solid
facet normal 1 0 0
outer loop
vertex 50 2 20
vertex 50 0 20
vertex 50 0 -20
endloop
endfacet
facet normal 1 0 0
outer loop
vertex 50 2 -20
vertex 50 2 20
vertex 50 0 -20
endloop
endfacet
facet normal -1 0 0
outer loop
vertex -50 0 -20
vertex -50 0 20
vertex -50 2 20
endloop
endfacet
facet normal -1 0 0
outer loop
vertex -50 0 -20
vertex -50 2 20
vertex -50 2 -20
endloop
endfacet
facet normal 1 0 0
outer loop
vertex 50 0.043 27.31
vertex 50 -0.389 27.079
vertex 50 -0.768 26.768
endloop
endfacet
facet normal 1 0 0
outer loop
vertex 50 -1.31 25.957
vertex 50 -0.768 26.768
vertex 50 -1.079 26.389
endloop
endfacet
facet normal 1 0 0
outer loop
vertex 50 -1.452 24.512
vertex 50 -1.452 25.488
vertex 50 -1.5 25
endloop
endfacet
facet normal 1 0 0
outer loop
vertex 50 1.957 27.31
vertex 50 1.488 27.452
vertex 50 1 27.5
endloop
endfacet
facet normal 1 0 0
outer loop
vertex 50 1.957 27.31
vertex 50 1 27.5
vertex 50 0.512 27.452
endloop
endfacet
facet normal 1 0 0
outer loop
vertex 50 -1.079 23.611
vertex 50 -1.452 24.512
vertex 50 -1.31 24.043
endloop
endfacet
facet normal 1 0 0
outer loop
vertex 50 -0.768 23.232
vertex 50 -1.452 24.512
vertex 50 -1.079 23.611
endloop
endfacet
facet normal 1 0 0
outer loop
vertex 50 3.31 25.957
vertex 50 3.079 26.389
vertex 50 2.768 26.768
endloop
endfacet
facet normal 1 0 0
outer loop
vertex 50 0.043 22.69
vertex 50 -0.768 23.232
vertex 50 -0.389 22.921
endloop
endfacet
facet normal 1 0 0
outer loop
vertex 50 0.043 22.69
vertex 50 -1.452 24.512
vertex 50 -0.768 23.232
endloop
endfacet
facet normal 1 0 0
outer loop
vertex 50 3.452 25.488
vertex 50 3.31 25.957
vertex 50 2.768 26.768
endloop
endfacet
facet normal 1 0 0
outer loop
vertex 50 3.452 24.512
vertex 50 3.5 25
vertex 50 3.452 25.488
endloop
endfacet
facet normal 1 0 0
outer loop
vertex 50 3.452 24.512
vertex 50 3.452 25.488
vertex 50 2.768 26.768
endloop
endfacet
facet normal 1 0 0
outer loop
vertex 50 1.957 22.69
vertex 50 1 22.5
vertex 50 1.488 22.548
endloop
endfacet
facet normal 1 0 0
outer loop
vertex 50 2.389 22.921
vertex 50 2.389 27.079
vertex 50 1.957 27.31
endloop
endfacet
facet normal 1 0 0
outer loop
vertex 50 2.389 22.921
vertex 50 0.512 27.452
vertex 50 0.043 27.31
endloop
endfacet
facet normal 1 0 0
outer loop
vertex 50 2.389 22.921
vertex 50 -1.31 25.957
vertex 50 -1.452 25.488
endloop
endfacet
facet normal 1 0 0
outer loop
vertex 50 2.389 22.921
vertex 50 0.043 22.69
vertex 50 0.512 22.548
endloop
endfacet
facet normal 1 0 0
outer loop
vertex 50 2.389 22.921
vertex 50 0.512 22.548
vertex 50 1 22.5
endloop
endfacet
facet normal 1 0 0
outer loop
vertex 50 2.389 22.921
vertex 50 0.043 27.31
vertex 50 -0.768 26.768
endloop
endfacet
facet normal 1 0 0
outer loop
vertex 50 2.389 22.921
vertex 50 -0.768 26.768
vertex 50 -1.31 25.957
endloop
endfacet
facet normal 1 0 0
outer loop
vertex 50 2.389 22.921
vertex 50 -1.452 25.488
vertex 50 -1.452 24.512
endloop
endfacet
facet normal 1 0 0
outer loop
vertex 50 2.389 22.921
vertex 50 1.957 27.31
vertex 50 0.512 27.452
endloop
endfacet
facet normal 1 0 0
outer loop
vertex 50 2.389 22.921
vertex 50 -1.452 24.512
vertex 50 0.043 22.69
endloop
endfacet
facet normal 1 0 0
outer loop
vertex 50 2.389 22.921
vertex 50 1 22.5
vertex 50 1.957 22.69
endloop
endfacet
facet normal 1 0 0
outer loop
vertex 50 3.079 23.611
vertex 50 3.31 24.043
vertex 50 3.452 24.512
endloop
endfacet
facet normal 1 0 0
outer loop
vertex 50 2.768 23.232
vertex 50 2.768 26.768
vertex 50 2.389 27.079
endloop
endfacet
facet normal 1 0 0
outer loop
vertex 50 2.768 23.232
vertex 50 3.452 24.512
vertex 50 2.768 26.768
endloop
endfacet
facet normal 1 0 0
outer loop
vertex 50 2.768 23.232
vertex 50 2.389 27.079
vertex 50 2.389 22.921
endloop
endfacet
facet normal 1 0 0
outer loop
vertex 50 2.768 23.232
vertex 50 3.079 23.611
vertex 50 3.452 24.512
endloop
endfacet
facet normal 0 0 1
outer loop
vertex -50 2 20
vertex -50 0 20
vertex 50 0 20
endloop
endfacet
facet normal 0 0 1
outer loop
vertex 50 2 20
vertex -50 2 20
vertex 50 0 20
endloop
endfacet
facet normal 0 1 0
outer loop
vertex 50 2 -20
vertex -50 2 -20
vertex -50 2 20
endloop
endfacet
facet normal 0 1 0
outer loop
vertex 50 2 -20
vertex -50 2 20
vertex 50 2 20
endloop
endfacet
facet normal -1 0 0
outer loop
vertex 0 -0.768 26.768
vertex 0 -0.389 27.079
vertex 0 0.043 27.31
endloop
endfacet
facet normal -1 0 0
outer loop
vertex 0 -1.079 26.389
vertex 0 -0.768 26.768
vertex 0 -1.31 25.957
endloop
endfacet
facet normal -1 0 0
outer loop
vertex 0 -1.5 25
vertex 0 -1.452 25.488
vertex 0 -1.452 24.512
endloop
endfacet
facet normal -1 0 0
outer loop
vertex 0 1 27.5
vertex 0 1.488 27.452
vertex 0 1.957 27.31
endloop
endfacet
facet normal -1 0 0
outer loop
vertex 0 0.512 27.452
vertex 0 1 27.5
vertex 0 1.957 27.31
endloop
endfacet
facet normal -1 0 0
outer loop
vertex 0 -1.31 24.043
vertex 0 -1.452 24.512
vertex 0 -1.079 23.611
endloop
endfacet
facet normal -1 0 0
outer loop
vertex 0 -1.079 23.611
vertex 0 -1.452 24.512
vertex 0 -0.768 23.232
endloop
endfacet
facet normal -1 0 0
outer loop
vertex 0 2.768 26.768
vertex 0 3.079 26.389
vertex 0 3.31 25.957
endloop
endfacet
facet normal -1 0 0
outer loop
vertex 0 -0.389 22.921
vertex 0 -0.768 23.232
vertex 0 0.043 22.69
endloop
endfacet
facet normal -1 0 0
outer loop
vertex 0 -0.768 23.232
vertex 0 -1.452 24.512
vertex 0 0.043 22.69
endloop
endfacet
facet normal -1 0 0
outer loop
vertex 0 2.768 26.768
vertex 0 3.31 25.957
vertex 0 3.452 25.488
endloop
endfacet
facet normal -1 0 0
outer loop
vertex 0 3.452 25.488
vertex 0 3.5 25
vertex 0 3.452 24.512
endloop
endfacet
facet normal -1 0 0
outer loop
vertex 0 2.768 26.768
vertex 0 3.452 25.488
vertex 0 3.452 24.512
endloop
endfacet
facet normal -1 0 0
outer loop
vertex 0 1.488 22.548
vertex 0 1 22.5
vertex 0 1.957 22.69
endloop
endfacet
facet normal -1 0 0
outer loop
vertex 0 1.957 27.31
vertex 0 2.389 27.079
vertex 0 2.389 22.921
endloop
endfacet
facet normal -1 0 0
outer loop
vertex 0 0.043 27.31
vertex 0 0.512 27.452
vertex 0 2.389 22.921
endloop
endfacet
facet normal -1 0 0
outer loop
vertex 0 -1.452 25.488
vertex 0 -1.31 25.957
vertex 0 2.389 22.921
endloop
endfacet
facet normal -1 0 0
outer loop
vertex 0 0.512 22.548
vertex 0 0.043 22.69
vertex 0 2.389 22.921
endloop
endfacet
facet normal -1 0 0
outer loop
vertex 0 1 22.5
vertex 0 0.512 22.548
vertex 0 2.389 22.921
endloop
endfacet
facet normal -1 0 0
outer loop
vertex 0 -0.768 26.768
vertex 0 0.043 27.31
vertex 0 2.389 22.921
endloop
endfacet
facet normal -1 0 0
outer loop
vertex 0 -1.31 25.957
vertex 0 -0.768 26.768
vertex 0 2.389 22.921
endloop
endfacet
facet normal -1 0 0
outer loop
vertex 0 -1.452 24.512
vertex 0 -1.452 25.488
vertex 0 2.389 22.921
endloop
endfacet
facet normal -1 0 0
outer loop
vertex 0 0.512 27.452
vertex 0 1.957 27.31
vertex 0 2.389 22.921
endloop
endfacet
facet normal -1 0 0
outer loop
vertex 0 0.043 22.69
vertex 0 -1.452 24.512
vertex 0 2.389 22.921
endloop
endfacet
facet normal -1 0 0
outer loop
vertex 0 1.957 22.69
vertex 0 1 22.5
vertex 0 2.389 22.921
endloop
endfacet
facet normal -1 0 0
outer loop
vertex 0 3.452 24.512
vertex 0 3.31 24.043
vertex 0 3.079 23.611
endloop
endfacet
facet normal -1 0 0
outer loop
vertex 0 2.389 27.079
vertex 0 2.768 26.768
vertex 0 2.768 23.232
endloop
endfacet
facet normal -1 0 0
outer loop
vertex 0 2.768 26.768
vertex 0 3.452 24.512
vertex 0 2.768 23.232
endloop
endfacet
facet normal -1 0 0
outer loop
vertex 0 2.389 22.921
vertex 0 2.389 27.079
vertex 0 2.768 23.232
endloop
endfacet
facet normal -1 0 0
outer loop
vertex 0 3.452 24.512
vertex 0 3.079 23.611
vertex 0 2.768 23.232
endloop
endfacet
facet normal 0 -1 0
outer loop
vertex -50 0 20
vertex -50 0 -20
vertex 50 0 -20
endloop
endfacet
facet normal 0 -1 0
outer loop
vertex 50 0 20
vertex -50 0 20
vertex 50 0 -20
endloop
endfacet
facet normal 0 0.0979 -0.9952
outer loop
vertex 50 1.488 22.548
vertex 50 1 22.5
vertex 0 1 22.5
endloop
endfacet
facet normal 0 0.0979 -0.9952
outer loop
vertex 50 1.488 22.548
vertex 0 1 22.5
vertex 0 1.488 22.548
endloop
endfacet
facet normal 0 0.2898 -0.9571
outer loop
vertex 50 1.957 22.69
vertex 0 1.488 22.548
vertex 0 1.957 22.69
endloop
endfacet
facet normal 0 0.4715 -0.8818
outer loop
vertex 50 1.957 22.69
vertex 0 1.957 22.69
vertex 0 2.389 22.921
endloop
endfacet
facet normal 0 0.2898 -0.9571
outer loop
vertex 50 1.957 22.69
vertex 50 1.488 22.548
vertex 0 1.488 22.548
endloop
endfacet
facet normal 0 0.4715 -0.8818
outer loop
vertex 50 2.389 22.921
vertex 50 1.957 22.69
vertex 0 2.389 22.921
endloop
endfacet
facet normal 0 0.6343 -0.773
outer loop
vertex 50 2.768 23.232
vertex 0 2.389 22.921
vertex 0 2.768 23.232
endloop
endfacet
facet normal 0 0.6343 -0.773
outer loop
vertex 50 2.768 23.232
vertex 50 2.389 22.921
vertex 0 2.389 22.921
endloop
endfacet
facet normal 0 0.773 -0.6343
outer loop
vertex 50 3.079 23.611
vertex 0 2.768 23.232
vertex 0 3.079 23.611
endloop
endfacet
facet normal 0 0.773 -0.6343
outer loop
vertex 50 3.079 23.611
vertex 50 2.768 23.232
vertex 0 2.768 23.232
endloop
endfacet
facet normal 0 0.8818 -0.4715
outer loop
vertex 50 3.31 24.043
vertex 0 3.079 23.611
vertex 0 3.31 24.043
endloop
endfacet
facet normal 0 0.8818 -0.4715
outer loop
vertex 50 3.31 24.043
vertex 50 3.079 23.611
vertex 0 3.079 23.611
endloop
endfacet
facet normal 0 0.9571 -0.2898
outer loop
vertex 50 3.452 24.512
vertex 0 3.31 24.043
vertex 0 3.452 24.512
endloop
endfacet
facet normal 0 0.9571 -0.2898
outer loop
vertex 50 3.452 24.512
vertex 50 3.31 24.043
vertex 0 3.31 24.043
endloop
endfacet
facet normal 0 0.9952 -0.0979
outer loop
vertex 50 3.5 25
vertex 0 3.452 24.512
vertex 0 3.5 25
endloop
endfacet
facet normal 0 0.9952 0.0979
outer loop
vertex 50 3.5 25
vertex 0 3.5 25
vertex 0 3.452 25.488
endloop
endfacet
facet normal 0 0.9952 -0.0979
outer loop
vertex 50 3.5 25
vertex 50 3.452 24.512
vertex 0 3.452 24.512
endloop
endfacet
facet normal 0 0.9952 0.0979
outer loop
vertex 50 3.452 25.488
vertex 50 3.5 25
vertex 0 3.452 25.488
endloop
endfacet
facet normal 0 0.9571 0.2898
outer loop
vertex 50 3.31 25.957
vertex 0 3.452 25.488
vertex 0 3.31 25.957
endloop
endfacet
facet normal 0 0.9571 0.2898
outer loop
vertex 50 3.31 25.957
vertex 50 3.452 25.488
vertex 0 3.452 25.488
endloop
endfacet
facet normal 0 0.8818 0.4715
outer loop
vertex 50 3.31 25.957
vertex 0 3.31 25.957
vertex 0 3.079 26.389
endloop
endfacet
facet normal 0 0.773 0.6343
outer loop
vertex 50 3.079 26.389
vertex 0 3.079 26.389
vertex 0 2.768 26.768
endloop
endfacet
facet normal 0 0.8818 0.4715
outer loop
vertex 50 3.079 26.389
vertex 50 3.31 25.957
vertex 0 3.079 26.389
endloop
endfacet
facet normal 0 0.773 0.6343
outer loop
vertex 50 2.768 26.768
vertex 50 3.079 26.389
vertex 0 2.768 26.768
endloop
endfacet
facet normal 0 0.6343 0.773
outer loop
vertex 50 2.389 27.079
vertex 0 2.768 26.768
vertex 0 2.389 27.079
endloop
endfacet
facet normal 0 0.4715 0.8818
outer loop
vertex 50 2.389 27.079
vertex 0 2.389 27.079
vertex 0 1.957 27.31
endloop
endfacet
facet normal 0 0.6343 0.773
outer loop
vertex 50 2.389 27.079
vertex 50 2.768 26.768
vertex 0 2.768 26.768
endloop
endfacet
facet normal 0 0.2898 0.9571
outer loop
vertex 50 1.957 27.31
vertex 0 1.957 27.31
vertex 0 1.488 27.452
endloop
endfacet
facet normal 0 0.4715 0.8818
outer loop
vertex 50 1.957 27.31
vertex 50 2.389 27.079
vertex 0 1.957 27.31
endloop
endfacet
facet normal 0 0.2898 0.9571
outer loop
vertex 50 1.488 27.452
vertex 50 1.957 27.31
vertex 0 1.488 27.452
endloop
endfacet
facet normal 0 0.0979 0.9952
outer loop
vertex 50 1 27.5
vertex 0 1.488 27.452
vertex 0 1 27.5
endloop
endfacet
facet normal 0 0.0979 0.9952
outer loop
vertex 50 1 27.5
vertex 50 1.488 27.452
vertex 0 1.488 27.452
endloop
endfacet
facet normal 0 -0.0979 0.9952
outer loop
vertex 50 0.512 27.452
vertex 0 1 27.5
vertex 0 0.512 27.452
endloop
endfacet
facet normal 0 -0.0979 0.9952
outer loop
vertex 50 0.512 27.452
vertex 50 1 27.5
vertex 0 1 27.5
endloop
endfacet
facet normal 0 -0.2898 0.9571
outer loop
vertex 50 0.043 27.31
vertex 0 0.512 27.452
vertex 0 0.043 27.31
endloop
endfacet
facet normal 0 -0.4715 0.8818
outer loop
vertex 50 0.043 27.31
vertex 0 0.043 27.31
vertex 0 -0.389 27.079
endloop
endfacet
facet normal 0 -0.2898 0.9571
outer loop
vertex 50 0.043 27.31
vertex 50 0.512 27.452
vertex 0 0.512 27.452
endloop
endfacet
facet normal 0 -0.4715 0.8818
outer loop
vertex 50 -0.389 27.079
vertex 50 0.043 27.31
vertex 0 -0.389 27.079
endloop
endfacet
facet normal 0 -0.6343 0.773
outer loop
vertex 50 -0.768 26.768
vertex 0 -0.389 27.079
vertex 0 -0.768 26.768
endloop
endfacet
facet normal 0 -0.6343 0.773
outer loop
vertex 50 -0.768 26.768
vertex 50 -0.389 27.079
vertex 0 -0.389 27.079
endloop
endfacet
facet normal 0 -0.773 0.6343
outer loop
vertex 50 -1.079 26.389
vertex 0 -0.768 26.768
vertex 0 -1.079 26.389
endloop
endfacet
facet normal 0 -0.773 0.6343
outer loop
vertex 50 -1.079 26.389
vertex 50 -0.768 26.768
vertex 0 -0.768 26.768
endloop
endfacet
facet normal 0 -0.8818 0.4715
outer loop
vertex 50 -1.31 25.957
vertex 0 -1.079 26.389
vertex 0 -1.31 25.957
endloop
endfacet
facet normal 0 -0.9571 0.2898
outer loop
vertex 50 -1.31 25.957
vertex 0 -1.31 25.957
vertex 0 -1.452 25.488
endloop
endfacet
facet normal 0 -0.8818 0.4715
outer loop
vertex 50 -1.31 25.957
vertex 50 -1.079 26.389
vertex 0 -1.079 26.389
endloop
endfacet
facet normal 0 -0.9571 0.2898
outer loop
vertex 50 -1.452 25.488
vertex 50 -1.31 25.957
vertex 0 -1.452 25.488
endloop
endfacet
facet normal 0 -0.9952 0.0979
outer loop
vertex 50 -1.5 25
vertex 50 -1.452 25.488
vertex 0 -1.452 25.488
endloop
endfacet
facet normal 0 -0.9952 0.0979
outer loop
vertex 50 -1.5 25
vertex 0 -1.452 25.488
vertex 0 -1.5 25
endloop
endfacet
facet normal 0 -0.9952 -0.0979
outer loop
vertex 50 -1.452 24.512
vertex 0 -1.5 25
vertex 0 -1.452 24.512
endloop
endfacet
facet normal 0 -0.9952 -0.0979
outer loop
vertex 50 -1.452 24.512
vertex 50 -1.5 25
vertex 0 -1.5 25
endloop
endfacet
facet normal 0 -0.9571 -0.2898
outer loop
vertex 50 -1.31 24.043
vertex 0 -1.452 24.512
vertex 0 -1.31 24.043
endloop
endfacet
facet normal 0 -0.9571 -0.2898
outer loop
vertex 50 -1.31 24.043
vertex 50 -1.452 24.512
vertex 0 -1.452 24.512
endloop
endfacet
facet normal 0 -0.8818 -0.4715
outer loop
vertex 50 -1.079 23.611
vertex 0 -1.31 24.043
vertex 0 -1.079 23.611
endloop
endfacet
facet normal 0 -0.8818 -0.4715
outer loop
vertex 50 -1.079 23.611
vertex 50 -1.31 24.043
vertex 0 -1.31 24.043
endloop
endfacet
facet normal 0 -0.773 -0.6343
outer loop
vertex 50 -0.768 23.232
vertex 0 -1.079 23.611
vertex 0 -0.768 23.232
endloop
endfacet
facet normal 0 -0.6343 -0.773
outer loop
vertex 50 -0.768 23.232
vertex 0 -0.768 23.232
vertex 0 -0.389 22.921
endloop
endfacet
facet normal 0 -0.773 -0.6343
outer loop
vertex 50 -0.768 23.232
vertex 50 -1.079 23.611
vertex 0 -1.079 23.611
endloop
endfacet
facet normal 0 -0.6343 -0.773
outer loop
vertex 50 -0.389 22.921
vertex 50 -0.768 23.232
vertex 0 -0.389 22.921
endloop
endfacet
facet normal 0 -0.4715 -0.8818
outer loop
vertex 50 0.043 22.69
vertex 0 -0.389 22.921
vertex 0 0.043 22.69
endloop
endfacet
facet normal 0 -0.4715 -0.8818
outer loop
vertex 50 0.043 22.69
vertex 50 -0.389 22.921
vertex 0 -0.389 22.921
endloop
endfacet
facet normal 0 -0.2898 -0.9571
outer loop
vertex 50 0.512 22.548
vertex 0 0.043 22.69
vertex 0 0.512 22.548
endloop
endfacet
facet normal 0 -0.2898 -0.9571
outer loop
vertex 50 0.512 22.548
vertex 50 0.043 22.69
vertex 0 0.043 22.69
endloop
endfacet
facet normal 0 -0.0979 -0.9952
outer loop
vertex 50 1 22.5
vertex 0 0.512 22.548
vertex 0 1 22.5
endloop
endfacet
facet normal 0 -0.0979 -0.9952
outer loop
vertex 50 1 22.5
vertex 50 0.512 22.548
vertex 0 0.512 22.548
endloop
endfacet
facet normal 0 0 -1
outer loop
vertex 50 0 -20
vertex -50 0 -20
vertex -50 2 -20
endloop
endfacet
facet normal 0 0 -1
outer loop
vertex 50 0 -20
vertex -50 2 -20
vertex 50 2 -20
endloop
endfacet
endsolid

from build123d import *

# Parameters (mm, degrees)
SKETCH1_W           = 100
SKETCH1_H           = 40
BOSS_EXTRUDE1_DEPTH = 2
SKETCH2_R           = 2.5
BOSS_EXTRUDE2_DEPTH = 50


with BuildPart() as part:
    # Sketch1 → Boss-Extrude1 (new body)
    with BuildSketch(Plane(origin=(0, 0, 0), x_dir=(1, 0, 0), z_dir=(0, 1, 0))):
        Rectangle(SKETCH1_W, SKETCH1_H)
    extrude(amount=BOSS_EXTRUDE1_DEPTH)


with BuildPart() as body_2:
    # Sketch2 → Boss-Extrude2 (new body)
    with BuildSketch(Plane(origin=(50, 0, 0), x_dir=(0, 0, -1), z_dir=(1, 0, 0))):
        with Locations((-25, 1)):
            Circle(SKETCH2_R)
    extrude(amount=-BOSS_EXTRUDE2_DEPTH)


solid = Compound([part.part, body_2.part])
